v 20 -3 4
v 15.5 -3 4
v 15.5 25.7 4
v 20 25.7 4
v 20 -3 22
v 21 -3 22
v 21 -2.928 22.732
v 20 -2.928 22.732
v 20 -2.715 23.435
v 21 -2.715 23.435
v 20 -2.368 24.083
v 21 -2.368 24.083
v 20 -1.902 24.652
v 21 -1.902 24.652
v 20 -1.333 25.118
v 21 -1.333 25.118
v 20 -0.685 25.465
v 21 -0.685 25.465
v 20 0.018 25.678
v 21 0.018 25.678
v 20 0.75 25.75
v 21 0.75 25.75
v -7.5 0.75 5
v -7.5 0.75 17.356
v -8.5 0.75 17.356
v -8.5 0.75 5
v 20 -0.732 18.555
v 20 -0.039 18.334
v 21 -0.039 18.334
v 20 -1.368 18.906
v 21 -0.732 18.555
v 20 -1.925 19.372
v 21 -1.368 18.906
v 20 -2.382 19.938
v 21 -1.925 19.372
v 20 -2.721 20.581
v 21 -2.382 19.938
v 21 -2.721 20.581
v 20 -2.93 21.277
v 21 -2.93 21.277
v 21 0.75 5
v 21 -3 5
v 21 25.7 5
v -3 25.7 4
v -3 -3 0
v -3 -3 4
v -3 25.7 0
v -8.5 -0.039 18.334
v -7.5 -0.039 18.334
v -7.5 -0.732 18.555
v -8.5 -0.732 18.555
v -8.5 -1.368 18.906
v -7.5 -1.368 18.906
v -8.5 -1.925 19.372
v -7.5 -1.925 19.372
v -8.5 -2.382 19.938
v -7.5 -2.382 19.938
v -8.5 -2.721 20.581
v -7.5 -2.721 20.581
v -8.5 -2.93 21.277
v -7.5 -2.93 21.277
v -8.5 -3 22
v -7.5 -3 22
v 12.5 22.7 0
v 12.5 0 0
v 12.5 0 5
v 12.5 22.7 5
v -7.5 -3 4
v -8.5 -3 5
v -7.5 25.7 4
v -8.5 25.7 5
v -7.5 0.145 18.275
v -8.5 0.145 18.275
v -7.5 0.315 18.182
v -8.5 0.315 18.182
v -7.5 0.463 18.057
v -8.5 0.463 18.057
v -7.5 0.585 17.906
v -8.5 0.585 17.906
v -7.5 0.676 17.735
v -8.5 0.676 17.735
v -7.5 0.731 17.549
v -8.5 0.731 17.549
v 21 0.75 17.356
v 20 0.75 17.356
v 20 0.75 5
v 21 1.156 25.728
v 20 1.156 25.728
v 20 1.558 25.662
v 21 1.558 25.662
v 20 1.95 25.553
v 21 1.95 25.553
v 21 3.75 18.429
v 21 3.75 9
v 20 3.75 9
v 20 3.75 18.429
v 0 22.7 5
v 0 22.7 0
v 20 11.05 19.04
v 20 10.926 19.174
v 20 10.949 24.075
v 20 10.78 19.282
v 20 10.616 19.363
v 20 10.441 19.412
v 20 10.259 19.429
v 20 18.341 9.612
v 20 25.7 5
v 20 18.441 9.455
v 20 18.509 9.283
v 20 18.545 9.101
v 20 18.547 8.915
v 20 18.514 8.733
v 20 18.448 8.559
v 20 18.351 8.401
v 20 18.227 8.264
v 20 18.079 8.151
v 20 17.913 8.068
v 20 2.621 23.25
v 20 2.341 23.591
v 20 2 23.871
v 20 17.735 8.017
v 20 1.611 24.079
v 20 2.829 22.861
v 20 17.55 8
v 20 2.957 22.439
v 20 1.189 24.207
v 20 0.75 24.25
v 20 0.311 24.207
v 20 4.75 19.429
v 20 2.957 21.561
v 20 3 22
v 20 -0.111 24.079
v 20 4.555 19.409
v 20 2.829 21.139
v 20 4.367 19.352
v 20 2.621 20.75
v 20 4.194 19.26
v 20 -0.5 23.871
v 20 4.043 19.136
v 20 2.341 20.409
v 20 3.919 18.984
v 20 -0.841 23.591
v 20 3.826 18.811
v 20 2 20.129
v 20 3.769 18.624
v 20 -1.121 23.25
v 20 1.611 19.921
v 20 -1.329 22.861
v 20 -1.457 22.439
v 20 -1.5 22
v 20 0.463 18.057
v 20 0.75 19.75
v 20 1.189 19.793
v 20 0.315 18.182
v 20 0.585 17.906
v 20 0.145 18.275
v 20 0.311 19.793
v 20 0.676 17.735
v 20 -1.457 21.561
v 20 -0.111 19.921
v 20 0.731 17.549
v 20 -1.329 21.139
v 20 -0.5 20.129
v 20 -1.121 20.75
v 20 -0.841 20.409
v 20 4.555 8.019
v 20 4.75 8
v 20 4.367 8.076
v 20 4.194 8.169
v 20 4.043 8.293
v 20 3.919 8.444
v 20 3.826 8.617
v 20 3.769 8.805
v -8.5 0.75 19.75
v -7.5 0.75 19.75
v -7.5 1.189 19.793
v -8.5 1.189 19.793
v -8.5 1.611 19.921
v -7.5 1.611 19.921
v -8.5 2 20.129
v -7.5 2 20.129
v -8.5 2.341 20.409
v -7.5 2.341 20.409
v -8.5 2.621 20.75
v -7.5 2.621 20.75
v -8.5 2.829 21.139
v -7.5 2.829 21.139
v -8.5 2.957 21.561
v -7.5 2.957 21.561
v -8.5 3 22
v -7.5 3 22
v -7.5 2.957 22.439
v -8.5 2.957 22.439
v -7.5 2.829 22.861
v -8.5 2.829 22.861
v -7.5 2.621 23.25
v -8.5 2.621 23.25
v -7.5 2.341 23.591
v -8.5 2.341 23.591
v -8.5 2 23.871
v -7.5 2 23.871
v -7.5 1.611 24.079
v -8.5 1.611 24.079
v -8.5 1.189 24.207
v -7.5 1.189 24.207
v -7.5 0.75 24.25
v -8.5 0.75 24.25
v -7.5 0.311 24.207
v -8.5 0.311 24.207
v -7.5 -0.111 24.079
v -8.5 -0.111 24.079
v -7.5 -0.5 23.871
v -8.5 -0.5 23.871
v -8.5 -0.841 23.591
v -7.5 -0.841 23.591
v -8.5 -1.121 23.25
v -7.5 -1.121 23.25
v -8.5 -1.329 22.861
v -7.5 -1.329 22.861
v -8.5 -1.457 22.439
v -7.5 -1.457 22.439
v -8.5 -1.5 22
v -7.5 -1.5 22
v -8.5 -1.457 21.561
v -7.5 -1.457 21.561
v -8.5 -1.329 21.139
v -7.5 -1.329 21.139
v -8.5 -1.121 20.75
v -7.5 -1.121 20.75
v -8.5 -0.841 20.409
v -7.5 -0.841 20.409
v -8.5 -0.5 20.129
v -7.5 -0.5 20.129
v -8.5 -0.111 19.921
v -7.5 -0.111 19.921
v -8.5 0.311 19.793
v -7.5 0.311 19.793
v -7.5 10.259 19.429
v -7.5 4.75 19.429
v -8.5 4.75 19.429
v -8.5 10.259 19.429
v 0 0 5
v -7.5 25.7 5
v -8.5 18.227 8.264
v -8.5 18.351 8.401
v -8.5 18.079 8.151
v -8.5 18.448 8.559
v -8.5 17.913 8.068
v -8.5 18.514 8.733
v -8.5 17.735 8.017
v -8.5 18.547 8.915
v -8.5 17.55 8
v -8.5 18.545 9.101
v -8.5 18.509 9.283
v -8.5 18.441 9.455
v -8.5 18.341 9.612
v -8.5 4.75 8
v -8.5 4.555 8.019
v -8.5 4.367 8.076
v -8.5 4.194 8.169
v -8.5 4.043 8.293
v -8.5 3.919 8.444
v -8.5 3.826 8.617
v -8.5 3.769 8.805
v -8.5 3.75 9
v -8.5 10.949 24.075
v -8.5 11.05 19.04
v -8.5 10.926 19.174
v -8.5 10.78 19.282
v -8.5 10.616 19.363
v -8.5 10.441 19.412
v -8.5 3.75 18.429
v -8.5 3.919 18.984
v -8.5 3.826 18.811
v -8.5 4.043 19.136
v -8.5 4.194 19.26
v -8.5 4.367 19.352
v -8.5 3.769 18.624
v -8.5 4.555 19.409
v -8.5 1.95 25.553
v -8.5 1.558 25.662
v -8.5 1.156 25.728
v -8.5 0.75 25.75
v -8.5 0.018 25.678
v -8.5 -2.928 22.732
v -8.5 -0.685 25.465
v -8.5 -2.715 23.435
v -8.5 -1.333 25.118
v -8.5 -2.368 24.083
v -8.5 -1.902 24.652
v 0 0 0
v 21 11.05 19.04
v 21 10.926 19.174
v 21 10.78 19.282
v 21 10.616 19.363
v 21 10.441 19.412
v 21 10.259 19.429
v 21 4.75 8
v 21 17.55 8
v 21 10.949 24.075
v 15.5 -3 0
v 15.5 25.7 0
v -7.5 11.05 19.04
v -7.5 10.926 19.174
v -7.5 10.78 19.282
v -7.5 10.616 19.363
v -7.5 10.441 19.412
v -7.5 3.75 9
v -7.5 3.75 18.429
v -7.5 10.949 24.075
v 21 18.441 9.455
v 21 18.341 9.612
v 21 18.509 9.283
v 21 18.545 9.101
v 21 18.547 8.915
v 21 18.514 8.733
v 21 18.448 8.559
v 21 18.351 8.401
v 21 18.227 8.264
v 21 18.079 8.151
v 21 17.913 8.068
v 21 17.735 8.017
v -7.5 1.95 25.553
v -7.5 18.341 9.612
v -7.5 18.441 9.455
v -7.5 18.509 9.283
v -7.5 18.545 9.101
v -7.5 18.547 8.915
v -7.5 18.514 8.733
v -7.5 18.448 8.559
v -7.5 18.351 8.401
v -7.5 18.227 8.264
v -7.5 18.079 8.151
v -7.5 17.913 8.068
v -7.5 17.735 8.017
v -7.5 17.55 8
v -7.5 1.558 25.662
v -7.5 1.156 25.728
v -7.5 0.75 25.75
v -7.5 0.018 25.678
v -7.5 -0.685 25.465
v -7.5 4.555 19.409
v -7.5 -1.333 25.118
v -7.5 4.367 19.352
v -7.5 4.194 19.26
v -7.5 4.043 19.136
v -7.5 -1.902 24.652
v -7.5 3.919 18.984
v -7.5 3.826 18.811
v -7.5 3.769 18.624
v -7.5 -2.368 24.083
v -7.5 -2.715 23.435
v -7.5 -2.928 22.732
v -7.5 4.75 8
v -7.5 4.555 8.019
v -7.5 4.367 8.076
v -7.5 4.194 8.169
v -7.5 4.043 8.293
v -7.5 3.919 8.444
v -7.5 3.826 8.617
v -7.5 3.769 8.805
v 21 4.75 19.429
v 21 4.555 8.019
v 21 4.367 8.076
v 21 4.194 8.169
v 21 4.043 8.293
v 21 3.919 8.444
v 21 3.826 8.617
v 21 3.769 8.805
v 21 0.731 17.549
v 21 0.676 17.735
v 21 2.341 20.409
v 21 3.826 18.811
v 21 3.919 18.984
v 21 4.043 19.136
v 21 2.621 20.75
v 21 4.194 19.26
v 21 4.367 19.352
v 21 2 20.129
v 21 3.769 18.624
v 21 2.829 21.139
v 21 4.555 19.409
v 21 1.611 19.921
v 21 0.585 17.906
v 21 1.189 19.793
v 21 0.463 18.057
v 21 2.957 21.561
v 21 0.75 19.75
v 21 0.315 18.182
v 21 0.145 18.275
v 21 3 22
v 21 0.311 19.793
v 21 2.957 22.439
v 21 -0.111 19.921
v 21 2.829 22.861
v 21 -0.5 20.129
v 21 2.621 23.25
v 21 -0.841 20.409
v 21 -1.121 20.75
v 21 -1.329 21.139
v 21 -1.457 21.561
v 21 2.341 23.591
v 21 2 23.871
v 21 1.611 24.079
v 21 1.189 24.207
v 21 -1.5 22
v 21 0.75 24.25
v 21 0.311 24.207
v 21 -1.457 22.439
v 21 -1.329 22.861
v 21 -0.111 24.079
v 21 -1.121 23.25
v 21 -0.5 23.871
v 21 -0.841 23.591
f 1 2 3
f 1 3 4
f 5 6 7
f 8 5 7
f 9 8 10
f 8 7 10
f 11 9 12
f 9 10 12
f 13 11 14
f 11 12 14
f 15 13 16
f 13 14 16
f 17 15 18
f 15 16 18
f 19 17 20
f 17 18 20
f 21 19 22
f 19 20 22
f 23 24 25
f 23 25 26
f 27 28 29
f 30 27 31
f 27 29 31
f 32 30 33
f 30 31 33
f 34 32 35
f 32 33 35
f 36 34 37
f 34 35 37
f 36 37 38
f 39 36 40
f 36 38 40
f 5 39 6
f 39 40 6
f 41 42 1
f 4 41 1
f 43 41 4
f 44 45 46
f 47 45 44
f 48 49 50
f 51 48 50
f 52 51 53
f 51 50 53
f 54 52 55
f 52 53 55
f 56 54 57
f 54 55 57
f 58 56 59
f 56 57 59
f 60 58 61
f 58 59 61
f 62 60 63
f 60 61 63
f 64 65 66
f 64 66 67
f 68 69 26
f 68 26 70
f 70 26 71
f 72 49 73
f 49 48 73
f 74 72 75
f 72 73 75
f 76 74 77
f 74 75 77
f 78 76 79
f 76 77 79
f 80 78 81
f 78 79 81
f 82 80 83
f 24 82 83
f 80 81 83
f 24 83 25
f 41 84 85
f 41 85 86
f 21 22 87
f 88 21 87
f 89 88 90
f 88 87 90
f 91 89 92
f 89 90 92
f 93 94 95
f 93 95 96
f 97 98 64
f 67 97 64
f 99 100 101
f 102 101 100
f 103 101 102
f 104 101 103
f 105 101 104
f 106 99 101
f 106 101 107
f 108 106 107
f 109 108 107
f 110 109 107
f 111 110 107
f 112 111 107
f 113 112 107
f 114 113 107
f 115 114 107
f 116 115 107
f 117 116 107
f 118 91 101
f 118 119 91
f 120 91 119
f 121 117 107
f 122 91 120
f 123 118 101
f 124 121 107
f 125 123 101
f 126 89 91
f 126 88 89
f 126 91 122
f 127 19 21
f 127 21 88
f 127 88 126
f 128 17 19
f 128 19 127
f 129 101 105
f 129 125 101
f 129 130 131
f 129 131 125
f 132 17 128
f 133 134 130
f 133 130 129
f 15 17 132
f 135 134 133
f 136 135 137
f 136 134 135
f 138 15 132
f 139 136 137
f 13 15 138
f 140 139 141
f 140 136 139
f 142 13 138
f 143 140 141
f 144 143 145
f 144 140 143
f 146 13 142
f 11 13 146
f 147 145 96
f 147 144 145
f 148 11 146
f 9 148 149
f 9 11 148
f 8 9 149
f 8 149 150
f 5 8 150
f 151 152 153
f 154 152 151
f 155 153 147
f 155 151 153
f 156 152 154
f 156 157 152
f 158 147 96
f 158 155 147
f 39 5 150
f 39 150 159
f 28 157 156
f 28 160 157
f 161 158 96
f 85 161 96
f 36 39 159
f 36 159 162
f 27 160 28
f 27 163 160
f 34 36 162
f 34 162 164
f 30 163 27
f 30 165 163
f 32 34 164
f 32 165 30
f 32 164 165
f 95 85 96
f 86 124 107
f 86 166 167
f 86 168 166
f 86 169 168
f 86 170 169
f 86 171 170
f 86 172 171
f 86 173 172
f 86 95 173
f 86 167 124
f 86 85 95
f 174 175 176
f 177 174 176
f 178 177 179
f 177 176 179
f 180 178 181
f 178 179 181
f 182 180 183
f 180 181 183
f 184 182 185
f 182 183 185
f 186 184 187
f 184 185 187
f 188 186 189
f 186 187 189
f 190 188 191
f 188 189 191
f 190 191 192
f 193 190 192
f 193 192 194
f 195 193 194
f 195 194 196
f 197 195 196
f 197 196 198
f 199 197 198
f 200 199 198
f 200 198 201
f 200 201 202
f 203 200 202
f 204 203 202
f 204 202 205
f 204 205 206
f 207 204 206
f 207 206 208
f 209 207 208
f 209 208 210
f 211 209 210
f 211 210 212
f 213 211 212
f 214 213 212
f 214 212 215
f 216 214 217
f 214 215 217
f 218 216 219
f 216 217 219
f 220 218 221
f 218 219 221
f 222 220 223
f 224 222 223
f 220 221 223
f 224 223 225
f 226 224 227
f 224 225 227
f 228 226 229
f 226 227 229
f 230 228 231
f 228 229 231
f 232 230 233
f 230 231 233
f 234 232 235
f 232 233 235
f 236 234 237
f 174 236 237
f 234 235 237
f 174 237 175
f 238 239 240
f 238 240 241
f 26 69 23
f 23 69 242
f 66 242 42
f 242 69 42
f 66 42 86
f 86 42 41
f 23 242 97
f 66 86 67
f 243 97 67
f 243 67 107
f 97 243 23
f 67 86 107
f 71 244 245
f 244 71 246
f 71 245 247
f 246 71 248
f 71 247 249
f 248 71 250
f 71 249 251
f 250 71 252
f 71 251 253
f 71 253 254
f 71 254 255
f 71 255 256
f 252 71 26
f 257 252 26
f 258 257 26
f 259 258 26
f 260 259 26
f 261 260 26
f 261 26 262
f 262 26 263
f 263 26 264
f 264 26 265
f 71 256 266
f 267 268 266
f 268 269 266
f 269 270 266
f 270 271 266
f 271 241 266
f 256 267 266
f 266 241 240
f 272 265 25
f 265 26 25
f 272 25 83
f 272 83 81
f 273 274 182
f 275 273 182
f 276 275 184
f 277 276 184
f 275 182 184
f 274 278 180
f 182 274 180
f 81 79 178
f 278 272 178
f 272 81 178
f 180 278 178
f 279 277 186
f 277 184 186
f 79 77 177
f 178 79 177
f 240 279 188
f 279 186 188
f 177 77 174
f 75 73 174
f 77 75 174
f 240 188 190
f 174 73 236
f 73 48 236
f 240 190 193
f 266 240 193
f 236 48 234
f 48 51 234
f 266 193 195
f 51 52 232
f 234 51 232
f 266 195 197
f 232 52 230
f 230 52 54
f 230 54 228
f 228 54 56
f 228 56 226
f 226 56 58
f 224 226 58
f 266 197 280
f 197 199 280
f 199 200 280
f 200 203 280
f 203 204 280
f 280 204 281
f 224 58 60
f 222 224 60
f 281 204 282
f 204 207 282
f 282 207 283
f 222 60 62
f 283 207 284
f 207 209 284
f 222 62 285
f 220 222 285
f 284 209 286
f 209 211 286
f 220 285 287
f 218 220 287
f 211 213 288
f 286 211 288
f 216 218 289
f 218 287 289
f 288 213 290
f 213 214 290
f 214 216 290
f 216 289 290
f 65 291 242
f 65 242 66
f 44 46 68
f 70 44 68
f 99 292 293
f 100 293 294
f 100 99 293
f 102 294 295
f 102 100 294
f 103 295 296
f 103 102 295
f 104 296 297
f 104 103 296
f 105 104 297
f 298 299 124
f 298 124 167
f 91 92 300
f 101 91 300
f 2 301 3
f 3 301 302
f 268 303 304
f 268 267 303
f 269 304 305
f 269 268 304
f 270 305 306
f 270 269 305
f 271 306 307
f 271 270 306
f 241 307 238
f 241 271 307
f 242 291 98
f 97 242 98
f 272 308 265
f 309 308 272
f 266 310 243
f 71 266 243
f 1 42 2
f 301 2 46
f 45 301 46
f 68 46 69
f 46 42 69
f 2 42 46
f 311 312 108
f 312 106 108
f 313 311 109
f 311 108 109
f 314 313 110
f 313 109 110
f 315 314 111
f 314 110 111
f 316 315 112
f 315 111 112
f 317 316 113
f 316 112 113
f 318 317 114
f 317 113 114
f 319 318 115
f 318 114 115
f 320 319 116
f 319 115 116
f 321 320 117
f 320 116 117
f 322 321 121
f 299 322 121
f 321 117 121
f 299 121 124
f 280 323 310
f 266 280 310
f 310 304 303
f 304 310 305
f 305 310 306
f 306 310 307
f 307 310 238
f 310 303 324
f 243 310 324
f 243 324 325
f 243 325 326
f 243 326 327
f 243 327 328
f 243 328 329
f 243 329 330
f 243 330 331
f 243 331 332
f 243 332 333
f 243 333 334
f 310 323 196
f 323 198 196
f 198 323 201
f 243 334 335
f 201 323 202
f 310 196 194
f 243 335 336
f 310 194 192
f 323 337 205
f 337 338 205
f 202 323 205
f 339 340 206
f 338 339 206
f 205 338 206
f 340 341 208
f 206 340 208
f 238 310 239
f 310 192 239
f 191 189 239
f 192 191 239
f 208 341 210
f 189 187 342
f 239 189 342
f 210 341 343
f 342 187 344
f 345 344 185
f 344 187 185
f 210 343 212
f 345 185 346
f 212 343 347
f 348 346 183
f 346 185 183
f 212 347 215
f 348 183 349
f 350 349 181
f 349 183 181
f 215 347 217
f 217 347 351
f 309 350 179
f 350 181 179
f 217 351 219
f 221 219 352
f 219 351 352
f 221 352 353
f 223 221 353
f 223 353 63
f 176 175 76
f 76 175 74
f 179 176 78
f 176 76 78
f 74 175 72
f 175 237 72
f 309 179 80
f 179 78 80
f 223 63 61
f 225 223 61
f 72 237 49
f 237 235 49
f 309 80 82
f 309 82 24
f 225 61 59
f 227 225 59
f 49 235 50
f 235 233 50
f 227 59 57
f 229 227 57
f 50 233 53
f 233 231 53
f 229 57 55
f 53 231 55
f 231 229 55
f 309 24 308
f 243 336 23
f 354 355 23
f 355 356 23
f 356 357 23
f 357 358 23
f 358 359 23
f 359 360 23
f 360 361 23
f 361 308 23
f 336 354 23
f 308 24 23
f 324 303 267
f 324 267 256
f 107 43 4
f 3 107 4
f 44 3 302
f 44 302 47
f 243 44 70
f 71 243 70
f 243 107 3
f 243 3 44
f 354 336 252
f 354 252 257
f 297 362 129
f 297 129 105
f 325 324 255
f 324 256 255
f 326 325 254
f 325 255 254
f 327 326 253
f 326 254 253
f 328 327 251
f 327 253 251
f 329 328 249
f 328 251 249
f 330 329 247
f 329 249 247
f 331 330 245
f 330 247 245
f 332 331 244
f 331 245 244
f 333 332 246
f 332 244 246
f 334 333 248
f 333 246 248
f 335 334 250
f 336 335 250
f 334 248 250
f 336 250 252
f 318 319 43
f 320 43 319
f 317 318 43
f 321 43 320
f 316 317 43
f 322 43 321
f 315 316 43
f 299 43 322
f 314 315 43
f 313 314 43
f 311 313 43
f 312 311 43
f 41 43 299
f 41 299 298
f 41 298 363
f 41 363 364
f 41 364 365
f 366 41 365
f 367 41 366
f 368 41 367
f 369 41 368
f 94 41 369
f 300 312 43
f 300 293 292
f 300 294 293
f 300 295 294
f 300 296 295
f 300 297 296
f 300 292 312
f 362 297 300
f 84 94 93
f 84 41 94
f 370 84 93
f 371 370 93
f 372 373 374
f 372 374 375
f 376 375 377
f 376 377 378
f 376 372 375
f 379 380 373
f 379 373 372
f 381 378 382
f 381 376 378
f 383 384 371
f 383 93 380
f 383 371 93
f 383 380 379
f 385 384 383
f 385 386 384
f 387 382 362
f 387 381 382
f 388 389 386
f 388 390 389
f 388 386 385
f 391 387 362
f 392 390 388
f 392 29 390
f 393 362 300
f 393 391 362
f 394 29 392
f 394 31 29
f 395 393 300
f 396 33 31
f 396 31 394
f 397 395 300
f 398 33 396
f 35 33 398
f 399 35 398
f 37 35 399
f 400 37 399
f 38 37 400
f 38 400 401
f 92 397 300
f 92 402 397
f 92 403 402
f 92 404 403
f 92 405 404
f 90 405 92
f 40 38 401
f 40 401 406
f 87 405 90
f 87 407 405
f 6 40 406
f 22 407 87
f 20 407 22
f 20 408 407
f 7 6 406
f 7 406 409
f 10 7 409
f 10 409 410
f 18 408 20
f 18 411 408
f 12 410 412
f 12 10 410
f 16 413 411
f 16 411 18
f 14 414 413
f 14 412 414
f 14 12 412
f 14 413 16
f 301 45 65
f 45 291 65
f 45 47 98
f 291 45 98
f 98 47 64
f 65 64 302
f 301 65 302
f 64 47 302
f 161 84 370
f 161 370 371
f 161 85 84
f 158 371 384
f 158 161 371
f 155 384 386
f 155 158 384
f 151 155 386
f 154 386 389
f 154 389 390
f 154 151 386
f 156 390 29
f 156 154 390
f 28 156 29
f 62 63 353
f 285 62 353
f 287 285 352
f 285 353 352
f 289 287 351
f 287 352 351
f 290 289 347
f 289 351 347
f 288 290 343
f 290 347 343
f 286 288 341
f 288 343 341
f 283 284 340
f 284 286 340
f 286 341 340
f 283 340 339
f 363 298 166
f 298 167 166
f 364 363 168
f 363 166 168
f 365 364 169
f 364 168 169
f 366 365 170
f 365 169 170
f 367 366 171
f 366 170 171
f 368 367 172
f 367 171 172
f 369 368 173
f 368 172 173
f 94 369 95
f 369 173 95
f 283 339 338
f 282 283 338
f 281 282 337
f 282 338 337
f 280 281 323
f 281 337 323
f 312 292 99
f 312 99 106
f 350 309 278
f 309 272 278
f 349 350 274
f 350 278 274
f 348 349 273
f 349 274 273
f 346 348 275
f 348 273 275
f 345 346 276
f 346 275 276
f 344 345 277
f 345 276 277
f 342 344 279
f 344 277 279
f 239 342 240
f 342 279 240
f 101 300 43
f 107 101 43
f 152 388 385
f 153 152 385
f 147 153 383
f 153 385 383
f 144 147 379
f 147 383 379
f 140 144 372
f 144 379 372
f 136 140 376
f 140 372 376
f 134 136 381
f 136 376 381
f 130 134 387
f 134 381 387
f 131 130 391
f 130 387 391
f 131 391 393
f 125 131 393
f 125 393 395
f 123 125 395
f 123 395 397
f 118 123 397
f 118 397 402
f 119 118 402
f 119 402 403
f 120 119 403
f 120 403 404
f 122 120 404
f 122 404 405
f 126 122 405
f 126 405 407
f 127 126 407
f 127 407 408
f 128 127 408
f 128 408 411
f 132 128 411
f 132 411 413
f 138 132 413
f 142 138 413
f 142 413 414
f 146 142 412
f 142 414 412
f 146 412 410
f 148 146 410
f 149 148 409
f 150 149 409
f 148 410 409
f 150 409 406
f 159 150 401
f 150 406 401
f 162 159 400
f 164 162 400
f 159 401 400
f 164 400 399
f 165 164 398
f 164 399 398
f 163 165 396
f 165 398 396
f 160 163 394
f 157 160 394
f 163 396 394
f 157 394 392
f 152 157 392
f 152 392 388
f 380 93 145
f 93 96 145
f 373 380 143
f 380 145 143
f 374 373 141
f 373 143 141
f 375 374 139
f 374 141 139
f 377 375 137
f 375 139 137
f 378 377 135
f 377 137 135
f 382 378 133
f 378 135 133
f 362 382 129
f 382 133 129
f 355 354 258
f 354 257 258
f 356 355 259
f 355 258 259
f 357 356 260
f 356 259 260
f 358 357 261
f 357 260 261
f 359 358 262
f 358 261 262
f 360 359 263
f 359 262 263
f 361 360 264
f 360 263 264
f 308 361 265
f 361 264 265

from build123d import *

# Parameters (mm, degrees)
SKETCH_1_W          = 18.5
SKETCH_1_H          = 28.7
SKETCH_1_W_2        = 12.5
SKETCH_1_H_2        = 22.7
EXTRUDE_1_DEPTH     = 5
EXTRUDE_2_DEPTH     = 28.7
CHAMFER_1_SIZE      = 1
SKETCH_3_W          = 13.25
SKETCH_3_H          = 3.75
CUT_EXTRUDE_1_DEPTH = 47.975951294
FILLET_1_R          = 1
CUT_EXTRUDE_2_DEPTH = 47.838045433
FILLET_2_R          = 1
SKETCH_6_R          = 2.25
CUT_EXTRUDE_3_DEPTH = 47.838045433


with BuildPart() as part:
    # 草图1 → 凸台-拉伸1 (new body)
    with BuildSketch(Plane.XY):
        with Locations((6.25, 11.35)):
            Rectangle(SKETCH_1_W, SKETCH_1_H)
        with Locations((6.25, 11.35)):
            Rectangle(SKETCH_1_W_2, SKETCH_1_H_2, mode=Mode.SUBTRACT)
    extrude(amount=EXTRUDE_1_DEPTH)

    # 草图2 → 凸台-拉伸2 (add)
    with BuildSketch(Plane.XZ.offset(3)):
        Polygon((-3, 5), (-3, 4), (-8.5, 4), (-8.5, 26), (-7.5, 26), (-7.5, 5), align=None)
        Polygon((20, 26), (20, 5), (15.5, 5), (15.5, 4), (21, 4), (21, 26), align=None)
    extrude(amount=-EXTRUDE_2_DEPTH)

    # 倒角1
    chamfer_1_edges = [part.edges().sort_by_distance(p)[0] for p in [
        (-8.5, 11.35, 4),
        (21, 11.35, 4),
    ]]
    chamfer(chamfer_1_edges, length=CHAMFER_1_SIZE)

    # 草图3 → 切除-拉伸1 (cut, through all)
    with BuildSketch(Plane(origin=(21, 0, 0), x_dir=(0, 0, -1), z_dir=(1, 0, 0))):
        with BuildLine():
            ThreePointArc((-25.75, 0.75), (-25.700415908, 1.357801045), (-25.552974874, 1.949528884))
            Line((-25.552974874, 1.949528884), (-24.074717326, 10.949460339))
            Line((-24.074717326, 10.949460339), (-5, 25.7))
            Line((-5, 25.7), (-26, 25.7))
            Line((-26, 25.7), (-26, 0.75))
            Line((-26, 0.75), (-25.75, 0.75))
        make_face()
        with BuildLine():
            Line((-26, -3), (-22, -3))
            ThreePointArc((-22, -3), (-24.651650429, -1.901650429), (-25.75, 0.75))
            Line((-25.75, 0.75), (-26, 0.75))
            Line((-26, 0.75), (-26, -3))
        make_face()
        with BuildLine():
            Line((-22, -3), (-18.25, -3))
            Line((-18.25, -3), (-18.25, 0.75))
            ThreePointArc((-18.25, 0.75), (-19.348349571, -1.901650429), (-22, -3))
        make_face()
        with Locations((-11.625, -1.125)):
            Rectangle(SKETCH_3_W, SKETCH_3_H)
    extrude(amount=-CUT_EXTRUDE_1_DEPTH, mode=Mode.SUBTRACT)

    # 圆角1
    fillet_1_edges = [part.edges().sort_by_distance(p)[0] for p in [
        (-8, 0.75, 18.25),
        (20.5, 0.75, 18.25),
    ]]
    fillet(fillet_1_edges, radius=FILLET_1_R)

    # 草图5 → 切除-拉伸2 (cut, through all)
    with BuildSketch(Plane(origin=(21, 0, 0), x_dir=(0, 0, -1), z_dir=(1, 0, 0))):
        Polygon((-19.428547646, 3.75), (-19.428547646, 10.75), (-8, 19.587732294), (-8, 3.75), align=None)
    extrude(amount=-CUT_EXTRUDE_2_DEPTH, mode=Mode.SUBTRACT)

    # 圆角2
    fillet_2_edges = [part.edges().sort_by_distance(p)[0] for p in [
        (-8, 3.75, 8),
        (-8, 3.75, 19.428547646),
        (-8, 10.75, 19.428547646),
        (-8, 19.587732294, 8),
        (20.5, 3.75, 8),
        (20.5, 3.75, 19.428547646),
        (20.5, 10.75, 19.428547646),
        (20.5, 19.587732294, 8),
    ]]
    fillet(fillet_2_edges, radius=FILLET_2_R)

    # 草图6 → 切除-拉伸3 (cut, through all)
    with BuildSketch(Plane(origin=(21, 0, 0), x_dir=(0, 0, -1), z_dir=(1, 0, 0))):
        with Locations((-22, 0.75)):
            Circle(SKETCH_6_R)
    extrude(amount=-CUT_EXTRUDE_3_DEPTH, mode=Mode.SUBTRACT)


solid = part.part
